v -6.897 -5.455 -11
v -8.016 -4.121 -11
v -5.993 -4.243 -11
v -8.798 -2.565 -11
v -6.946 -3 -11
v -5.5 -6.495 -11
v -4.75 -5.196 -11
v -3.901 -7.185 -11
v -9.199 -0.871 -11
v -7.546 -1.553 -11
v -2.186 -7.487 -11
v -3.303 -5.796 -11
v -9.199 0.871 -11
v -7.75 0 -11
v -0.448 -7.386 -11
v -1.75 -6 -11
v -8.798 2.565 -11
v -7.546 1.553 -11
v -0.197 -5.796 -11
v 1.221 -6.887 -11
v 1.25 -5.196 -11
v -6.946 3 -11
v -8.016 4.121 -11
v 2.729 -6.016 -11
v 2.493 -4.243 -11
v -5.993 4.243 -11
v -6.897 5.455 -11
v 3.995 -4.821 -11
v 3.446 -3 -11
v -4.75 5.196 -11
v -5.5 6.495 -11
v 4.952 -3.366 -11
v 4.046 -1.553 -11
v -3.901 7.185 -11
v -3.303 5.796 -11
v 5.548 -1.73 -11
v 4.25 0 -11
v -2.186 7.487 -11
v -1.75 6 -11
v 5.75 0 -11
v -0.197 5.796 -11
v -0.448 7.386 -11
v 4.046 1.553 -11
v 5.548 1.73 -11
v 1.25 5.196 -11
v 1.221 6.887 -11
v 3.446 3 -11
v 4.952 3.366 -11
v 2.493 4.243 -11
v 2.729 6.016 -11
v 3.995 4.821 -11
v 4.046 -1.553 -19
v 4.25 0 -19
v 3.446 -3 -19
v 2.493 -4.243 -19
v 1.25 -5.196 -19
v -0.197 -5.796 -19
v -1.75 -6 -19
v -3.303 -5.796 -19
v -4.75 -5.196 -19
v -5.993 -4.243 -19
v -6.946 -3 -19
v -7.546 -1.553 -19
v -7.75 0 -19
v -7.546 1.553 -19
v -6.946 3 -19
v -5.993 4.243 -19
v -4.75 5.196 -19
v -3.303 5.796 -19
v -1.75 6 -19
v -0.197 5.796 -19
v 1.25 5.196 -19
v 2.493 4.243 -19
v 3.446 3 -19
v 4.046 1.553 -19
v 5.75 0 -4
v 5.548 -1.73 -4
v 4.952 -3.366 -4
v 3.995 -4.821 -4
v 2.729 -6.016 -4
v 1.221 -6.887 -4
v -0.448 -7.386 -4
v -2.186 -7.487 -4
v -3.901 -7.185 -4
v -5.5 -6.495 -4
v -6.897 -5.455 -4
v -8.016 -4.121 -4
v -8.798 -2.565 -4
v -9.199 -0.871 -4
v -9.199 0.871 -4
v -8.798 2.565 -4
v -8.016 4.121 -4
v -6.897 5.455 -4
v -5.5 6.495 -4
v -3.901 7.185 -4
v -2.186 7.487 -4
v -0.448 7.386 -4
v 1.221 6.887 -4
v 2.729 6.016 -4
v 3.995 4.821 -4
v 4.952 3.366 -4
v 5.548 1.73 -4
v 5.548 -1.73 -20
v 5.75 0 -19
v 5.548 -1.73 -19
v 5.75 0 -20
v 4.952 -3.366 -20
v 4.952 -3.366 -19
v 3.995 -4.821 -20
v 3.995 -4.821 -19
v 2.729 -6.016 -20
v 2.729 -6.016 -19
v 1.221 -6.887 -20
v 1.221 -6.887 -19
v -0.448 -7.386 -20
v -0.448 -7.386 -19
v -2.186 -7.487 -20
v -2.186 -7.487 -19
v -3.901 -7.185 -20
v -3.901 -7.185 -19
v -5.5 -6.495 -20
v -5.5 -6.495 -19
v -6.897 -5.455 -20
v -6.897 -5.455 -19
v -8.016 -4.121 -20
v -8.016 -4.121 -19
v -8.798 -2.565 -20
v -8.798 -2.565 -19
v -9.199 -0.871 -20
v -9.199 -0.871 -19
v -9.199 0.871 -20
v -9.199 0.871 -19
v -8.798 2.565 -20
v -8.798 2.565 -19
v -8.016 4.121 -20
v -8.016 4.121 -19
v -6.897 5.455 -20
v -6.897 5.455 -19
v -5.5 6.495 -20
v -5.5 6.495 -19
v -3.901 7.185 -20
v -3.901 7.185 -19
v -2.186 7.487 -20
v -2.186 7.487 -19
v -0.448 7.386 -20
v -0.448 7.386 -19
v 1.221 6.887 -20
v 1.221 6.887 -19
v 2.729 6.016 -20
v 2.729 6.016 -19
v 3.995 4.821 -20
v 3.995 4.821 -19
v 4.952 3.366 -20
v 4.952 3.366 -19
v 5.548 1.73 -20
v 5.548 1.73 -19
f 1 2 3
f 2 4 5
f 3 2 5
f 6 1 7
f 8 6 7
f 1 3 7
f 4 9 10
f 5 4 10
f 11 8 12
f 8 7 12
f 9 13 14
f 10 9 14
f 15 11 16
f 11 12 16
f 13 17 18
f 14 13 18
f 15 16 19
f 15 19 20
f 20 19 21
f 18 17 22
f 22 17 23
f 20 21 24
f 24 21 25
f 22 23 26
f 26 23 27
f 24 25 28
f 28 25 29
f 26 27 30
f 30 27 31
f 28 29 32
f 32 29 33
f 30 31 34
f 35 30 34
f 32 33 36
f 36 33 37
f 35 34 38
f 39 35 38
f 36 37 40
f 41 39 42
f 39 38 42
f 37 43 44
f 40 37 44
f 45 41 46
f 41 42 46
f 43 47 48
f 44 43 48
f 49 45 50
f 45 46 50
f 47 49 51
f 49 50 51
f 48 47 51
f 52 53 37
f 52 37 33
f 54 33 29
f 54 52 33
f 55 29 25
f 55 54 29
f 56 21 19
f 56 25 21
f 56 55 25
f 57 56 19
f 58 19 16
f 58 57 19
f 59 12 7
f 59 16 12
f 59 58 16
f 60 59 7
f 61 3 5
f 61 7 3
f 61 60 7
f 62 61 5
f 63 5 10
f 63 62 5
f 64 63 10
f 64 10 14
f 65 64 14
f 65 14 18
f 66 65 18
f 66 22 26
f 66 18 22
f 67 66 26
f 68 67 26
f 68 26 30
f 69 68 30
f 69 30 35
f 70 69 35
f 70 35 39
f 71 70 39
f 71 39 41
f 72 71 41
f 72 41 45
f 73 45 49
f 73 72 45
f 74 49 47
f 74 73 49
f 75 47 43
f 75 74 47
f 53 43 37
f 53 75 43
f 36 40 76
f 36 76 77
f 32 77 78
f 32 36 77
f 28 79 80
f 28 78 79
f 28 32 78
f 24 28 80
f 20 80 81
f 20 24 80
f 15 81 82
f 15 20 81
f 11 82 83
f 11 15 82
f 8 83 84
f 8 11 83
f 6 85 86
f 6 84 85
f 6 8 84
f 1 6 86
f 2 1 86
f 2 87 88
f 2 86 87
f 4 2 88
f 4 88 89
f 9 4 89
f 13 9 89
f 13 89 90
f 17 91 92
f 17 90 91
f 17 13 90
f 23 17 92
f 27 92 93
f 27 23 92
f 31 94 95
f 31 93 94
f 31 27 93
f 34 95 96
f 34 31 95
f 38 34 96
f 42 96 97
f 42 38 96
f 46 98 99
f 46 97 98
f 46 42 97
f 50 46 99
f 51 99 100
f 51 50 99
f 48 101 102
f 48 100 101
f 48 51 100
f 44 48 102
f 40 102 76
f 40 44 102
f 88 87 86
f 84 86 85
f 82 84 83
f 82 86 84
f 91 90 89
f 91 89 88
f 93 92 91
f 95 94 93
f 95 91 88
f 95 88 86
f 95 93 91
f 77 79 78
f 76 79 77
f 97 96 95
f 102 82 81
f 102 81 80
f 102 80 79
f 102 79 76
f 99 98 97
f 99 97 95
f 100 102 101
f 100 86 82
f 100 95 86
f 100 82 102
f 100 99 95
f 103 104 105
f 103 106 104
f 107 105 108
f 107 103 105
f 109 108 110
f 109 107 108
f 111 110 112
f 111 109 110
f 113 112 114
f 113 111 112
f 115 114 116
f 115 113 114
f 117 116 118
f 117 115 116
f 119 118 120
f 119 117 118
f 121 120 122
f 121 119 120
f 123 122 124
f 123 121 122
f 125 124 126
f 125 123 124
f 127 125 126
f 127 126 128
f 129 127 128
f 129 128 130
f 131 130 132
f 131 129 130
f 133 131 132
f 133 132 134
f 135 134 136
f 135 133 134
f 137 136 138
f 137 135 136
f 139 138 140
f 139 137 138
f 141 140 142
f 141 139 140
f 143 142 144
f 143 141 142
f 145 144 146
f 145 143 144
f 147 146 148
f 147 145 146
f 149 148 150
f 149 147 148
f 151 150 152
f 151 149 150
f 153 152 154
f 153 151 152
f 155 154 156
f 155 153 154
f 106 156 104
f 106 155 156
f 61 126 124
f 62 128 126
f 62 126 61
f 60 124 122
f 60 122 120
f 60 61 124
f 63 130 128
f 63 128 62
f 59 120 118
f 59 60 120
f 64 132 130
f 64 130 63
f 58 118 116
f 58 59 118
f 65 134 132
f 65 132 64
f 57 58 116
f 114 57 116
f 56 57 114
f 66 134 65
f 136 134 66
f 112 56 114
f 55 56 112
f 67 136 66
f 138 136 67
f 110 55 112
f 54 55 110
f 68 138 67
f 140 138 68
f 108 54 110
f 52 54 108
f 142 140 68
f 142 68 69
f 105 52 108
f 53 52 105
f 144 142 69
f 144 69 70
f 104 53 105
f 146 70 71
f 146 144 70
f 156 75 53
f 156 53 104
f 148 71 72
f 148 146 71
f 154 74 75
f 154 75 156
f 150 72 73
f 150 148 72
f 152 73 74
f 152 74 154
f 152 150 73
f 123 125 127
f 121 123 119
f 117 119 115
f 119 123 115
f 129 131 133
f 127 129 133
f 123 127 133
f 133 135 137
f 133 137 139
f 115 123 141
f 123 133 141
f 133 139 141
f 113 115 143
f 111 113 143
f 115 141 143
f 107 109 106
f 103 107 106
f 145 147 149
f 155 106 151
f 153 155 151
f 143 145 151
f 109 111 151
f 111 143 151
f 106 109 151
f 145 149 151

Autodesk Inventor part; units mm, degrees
ref_plane "YZ Plane" through (0, 0, 0) normal (1, 0, 0) x (0, 1, 0)
ref_plane "XZ Plane" through (0, 0, 0) normal (0, 1, 0) x (-1, 0, 0)
ref_plane "Work Plane1" through (0, 0, -20) normal (0, 0, 1) x (1, 0, 0)
sketch "Sketch1" plane through (0, 0, -20) normal (0, 0, 1) x (1, 0, 0)
  circle A0 centre (-1.75, 0) radius 15.5 projected
  circle A1 centre (-1.75, 0) radius 7.5
  point P0 (0, 0)
  dimension "d1" = 15
extrude "Extrusion1" add sketch "Sketch1" along normal blind 1 contours A1
sketch "Sketch2" plane through (-1.75, 0, -19) normal (0, 0, 1) x (1, 0, 0)
  circle A0 centre (0, 0) radius 7.5 projected
  circle A1 centre (0, 0) radius 6
  point P0 (1.75, 0)
  dimension "d4" = 12
extrude "Extrusion2" add sketch "Sketch2" along normal blind 8 contours A1
sketch "Sketch3" plane through (-1.75, 0, -11) normal (0, 0, 1) x (1, 0, 0)
  circle A0 centre (0, 0) radius 7.5 projected
  circle A1 centre (0, 0) radius 7.5
  point P0 (1.75, 0)
extrude "Extrusion3" add sketch "Sketch3" along normal blind 7
properties part number "small pulley"
